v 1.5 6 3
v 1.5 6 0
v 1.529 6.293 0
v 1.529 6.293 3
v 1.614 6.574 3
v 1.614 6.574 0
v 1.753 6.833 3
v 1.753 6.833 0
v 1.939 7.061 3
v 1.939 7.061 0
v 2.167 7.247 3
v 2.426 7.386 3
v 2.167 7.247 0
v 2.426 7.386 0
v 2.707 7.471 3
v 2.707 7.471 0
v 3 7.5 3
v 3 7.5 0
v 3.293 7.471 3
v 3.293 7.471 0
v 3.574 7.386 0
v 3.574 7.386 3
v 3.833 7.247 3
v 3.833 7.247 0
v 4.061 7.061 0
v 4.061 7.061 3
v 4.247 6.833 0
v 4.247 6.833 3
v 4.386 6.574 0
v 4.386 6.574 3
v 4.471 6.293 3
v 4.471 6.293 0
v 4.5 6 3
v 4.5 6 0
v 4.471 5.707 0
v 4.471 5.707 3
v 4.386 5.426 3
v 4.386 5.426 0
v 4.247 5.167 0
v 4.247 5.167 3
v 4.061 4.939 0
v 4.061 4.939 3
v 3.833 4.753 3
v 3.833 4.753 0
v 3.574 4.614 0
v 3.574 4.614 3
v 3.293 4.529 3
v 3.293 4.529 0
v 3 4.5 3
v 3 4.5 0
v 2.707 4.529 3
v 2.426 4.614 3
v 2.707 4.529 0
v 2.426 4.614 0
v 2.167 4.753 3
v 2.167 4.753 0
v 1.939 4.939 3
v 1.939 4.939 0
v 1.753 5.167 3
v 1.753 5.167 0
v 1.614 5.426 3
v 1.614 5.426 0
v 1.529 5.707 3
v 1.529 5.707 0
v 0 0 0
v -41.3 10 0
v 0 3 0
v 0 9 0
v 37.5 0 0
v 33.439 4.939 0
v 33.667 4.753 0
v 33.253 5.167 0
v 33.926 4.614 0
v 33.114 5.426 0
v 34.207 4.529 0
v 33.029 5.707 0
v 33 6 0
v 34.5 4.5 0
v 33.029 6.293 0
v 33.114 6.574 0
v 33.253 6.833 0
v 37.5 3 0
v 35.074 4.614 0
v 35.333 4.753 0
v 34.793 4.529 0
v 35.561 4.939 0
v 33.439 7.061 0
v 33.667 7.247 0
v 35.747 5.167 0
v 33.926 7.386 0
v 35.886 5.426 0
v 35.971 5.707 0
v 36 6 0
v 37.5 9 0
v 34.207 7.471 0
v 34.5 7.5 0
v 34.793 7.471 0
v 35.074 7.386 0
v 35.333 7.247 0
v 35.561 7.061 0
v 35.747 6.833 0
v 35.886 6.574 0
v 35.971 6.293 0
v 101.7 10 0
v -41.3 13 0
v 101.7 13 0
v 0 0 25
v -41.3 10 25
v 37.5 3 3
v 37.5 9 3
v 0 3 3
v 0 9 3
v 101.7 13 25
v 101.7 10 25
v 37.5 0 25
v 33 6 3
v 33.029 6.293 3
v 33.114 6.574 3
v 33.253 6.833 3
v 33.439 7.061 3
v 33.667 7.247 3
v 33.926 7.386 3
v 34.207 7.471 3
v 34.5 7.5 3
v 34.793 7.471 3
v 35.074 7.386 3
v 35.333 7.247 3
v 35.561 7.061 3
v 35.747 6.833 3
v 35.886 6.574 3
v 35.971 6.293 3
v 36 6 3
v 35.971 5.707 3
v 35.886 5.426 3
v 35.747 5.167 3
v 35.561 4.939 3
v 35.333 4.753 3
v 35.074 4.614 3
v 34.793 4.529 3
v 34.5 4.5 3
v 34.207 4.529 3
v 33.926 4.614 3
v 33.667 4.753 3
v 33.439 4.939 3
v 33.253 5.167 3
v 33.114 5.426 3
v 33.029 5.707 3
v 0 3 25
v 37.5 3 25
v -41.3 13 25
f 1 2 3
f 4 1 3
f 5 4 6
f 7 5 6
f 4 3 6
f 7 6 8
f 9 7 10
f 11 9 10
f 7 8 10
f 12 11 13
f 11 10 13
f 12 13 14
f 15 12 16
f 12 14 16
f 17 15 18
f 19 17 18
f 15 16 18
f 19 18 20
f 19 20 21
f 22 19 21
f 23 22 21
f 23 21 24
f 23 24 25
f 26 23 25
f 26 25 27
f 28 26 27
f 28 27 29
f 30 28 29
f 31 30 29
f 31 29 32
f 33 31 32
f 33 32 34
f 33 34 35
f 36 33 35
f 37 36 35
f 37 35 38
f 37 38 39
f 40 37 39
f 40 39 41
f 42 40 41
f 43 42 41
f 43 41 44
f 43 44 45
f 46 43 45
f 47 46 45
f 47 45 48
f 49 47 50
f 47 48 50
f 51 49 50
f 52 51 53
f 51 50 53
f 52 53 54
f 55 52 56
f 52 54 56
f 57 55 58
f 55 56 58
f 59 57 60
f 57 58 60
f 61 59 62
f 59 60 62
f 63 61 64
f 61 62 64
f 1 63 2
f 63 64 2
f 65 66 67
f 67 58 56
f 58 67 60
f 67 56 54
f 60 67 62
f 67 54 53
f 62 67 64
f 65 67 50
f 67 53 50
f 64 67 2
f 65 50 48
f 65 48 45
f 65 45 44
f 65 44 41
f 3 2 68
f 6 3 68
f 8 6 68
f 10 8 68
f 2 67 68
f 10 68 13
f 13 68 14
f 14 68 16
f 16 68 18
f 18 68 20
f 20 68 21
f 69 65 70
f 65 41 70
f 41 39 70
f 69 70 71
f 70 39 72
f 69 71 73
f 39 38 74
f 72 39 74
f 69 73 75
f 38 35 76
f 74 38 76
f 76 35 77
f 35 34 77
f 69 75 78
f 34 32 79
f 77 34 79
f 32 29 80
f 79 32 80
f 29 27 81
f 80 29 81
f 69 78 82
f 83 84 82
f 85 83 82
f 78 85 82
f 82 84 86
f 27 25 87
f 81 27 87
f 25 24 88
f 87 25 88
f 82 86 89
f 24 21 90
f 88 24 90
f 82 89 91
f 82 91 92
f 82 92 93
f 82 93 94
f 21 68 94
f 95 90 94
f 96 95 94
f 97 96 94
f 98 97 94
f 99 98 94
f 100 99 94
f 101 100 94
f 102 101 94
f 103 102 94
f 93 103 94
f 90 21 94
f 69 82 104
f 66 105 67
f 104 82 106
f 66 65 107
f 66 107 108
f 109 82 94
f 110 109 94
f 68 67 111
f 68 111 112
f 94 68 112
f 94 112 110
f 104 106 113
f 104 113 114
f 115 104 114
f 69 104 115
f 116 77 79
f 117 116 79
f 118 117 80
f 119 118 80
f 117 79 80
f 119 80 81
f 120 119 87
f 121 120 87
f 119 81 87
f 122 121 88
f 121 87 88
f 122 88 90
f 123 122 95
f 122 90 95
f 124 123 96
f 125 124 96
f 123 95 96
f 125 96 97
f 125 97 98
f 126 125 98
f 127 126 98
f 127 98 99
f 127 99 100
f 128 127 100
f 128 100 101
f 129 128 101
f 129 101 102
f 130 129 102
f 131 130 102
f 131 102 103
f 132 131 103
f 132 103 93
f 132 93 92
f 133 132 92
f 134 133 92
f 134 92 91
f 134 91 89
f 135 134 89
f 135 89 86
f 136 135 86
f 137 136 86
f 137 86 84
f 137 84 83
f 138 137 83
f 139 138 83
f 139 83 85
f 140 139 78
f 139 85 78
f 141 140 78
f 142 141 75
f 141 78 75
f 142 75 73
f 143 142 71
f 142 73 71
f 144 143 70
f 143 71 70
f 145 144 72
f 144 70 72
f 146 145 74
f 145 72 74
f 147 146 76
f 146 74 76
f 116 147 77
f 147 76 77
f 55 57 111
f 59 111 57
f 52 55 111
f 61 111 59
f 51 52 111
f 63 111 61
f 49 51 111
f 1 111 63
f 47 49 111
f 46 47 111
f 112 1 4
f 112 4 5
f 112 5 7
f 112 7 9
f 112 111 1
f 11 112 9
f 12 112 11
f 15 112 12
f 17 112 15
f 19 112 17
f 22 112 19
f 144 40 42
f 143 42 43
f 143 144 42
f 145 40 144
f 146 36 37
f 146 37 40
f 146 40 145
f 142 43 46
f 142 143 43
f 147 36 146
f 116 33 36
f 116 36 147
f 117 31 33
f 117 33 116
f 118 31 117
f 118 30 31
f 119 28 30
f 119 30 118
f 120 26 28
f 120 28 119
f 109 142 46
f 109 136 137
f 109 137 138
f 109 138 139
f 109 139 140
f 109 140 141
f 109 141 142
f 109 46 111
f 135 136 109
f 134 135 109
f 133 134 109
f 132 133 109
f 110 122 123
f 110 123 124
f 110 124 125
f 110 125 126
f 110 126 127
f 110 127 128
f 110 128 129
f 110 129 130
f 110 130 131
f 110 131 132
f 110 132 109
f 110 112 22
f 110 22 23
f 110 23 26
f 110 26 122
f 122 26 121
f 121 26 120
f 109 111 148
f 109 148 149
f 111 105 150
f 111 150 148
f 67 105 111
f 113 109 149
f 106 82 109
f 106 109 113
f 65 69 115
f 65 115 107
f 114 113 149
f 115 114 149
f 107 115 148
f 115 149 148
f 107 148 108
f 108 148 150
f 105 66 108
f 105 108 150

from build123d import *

# Parameters (mm, degrees)
EXTRUDE_2_DEPTH     = 25
SKETCH_3_3_W        = 37.5
SKETCH_3_3_H        = 6
EXTRUDE_3_DEPTH     = 3
SKETCH_4_R          = 1.5
CUT_EXTRUDE_2_DEPTH = 4


with BuildPart() as part:
    # 草图3 → 凸台-拉伸2 (new body)
    with BuildSketch(Plane.XY):
        Polygon((-41.3, 10), (0, 0), (37.5, 0), (101.7, 10), (101.7, 13), (37.5, 3), (0, 3), (-41.3, 13), align=None)
    extrude(amount=EXTRUDE_2_DEPTH)

    # 草图3<3> → 凸台-拉伸3 (add)
    with BuildSketch(Plane.XY):
        with Locations((18.75, 6)):
            Rectangle(SKETCH_3_3_W, SKETCH_3_3_H)
    extrude(amount=EXTRUDE_3_DEPTH)

    # 草图4 → 切除-拉伸2 (cut)
    with BuildSketch(Plane(origin=(0, 0, 0), x_dir=(-1, 0, 0), z_dir=(0, 0, -1))):
        with Locations((-34.5, 6)):
            Circle(SKETCH_4_R)
        with Locations((-3, 6)):
            Circle(SKETCH_4_R)
    extrude(amount=-CUT_EXTRUDE_2_DEPTH, mode=Mode.SUBTRACT)


solid = part.part
